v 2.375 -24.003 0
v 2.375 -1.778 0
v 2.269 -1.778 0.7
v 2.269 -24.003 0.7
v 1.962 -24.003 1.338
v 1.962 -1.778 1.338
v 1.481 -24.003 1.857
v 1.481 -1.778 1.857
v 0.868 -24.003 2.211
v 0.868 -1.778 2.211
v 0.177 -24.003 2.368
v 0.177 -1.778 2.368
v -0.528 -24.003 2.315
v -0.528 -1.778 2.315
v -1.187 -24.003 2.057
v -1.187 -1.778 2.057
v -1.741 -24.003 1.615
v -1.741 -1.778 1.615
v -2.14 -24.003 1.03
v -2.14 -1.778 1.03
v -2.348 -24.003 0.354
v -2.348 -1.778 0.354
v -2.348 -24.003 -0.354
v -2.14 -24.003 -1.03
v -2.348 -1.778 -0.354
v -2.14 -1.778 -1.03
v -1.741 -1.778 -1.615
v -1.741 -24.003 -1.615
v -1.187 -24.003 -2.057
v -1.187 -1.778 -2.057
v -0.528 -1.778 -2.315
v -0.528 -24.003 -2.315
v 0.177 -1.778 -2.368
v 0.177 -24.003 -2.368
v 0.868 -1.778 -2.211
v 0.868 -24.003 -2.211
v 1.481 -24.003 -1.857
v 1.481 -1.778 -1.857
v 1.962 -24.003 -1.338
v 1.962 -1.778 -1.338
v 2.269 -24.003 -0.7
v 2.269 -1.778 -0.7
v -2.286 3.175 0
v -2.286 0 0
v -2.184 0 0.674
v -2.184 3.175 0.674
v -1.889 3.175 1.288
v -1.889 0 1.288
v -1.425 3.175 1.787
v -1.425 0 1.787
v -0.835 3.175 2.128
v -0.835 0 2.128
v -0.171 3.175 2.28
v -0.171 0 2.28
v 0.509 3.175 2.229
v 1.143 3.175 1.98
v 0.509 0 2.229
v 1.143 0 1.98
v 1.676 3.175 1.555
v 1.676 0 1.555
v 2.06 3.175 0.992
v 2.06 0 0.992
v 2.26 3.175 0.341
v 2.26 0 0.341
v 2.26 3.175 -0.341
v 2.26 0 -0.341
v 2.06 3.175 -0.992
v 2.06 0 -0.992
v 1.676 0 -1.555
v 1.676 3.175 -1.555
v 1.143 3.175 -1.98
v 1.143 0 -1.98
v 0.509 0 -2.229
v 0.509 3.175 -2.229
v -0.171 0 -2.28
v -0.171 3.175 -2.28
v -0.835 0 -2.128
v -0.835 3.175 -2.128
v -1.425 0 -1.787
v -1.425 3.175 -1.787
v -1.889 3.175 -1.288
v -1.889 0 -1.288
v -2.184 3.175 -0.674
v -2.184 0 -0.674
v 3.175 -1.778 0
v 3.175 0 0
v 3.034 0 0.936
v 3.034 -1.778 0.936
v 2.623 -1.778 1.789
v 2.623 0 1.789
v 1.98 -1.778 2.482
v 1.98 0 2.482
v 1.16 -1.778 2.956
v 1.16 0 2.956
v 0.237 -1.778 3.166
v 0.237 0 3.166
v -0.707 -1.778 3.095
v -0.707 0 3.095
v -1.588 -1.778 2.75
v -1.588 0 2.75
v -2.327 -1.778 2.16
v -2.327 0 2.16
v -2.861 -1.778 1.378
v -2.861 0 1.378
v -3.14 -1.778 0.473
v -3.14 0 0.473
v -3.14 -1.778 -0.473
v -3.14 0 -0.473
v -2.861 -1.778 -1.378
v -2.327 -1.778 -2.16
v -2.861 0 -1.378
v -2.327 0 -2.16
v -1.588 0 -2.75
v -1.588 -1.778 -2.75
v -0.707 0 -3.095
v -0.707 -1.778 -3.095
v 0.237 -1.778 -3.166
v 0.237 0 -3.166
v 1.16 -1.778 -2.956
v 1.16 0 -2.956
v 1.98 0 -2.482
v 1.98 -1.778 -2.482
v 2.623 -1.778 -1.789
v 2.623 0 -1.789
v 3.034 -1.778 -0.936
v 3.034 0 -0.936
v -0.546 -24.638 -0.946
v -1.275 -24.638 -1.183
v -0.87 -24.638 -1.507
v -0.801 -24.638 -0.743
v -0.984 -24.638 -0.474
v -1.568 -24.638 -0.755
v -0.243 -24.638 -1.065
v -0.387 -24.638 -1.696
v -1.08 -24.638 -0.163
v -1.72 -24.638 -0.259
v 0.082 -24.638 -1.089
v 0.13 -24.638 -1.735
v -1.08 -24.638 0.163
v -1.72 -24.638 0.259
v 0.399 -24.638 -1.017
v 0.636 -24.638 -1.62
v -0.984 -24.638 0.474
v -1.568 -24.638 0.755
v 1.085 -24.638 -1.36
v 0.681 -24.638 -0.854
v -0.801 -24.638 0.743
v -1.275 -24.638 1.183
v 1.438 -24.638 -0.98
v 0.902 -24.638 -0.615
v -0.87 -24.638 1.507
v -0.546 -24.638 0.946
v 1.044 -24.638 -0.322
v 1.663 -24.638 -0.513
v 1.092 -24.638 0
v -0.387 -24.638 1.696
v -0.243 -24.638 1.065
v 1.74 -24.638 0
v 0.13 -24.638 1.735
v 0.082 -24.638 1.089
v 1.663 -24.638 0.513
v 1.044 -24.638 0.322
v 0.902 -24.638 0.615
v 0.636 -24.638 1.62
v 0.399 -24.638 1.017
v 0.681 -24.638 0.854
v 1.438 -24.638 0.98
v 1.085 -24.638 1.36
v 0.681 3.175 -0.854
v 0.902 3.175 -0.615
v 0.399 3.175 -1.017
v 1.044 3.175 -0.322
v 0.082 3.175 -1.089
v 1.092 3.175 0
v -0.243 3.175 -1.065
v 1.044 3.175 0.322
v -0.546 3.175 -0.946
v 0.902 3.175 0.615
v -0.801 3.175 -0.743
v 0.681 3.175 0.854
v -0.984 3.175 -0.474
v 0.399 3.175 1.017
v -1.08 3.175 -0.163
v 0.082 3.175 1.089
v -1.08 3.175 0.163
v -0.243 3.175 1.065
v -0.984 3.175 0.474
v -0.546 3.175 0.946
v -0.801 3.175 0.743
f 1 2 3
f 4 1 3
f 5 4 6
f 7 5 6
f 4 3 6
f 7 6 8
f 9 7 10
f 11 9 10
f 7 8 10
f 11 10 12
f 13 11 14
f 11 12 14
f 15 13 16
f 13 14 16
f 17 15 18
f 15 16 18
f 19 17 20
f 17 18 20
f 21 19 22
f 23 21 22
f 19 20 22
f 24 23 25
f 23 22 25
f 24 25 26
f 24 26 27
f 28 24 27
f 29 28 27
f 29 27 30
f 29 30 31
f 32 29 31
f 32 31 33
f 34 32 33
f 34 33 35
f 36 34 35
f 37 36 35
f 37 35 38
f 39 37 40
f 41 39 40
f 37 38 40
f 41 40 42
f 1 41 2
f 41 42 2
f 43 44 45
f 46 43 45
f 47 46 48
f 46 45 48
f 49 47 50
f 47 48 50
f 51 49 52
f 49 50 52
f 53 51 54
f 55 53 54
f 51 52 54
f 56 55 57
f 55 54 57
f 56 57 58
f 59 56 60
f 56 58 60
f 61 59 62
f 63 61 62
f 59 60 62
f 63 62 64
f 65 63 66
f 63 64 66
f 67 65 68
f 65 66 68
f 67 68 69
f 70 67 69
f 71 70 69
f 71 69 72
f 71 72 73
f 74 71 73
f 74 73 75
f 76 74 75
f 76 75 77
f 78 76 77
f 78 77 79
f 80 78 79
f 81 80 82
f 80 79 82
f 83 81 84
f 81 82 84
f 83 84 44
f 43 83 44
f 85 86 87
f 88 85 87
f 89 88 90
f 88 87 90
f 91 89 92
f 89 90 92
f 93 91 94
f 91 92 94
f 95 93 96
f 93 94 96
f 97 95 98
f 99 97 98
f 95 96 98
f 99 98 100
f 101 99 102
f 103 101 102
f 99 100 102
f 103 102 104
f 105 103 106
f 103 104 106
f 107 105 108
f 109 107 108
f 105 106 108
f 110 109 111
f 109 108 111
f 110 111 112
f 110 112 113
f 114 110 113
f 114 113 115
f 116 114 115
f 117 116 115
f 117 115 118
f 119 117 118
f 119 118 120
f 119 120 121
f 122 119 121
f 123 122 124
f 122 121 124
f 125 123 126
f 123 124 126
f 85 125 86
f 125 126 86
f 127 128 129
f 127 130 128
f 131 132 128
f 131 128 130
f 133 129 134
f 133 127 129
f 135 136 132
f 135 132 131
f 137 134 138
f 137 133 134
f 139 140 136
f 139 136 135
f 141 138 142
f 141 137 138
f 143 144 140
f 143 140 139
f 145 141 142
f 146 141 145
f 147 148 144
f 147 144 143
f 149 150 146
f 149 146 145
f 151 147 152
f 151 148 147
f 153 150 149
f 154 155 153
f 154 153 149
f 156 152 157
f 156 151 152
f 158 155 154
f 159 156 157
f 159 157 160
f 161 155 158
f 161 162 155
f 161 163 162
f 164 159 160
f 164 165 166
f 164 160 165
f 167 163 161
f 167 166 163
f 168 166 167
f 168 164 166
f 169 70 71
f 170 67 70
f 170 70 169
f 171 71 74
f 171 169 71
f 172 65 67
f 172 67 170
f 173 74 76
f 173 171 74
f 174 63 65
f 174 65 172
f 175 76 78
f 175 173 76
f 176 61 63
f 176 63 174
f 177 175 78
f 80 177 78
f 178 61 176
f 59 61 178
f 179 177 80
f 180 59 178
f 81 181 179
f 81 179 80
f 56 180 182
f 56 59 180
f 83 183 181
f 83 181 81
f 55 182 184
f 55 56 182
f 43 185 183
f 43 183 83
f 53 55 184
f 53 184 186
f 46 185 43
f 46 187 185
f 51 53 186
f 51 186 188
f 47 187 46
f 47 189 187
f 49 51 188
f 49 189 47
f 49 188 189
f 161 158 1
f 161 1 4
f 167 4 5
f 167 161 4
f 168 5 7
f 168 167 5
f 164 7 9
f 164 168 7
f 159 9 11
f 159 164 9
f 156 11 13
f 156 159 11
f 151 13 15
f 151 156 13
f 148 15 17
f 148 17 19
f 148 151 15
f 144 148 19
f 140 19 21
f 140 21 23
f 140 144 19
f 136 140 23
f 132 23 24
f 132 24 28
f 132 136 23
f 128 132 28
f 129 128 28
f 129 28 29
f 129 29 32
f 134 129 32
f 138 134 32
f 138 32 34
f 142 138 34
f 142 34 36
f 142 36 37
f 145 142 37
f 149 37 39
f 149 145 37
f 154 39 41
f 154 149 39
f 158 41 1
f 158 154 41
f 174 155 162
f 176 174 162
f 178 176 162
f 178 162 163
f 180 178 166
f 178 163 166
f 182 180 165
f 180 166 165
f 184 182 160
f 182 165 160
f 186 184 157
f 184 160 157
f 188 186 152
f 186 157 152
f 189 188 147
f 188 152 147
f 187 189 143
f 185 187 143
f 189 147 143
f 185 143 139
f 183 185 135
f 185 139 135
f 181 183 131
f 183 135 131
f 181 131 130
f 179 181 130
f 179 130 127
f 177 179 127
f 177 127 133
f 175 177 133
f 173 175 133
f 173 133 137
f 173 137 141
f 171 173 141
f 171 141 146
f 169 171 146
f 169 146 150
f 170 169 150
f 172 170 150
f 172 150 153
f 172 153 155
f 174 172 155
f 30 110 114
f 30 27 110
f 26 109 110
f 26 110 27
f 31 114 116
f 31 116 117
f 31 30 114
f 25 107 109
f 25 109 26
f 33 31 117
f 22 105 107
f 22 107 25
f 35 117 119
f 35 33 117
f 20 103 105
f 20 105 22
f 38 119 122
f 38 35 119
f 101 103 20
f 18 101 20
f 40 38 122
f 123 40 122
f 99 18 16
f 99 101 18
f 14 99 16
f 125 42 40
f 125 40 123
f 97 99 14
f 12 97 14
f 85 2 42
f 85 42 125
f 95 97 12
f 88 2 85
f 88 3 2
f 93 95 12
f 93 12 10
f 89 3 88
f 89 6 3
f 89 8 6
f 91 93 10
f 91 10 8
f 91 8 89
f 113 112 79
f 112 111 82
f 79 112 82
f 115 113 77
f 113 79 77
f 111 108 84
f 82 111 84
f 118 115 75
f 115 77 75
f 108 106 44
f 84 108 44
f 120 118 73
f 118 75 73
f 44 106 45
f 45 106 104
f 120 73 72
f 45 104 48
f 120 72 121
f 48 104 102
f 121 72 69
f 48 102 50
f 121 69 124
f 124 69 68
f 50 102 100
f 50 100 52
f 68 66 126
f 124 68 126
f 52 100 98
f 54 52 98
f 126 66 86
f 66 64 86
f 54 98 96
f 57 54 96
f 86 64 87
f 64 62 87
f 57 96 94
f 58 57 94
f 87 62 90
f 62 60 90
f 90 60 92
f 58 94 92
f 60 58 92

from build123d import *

# Parameters (mm, degrees)
F0_R     = 3.175
F1_DEPTH = 1.778
F2_R     = 2.3749
F3_DEPTH = 22.86
F4_R     = 2.286
F5_DEPTH = 3.175
F6_R     = 1.0922
F7_DEPTH = 27.814
F8_SIZE  = 0.635


with BuildPart() as f1:
    # F0 (on Front) → F1 (new body)
    with BuildSketch(Plane.XZ):
        Circle(F0_R)
    extrude(amount=F1_DEPTH)

    # F2 (on face) → F3 (join)
    with BuildSketch(Plane.XZ.offset(1.778)):
        Circle(F2_R)
    extrude(amount=F3_DEPTH)

    # F4 (on face) → F5 (join)
    with BuildSketch(Plane(origin=(0, 0, 0), x_dir=(-1, 0, 0), z_dir=(0, 1, 0))):
        Circle(F4_R)
    extrude(amount=F5_DEPTH)

    # F6 (on face) → F7 (cut, through all)
    with BuildSketch(Plane.XZ.offset(24.638)):
        Circle(F6_R)
    extrude(amount=-F7_DEPTH, mode=Mode.SUBTRACT)

    # F8
    f8_edges = [f1.edges().sort_by_distance(p)[0] for p in [
        (-2.3749, -24.638, 0),
    ]]
    chamfer(f8_edges, length=F8_SIZE)


solid = f1.part
